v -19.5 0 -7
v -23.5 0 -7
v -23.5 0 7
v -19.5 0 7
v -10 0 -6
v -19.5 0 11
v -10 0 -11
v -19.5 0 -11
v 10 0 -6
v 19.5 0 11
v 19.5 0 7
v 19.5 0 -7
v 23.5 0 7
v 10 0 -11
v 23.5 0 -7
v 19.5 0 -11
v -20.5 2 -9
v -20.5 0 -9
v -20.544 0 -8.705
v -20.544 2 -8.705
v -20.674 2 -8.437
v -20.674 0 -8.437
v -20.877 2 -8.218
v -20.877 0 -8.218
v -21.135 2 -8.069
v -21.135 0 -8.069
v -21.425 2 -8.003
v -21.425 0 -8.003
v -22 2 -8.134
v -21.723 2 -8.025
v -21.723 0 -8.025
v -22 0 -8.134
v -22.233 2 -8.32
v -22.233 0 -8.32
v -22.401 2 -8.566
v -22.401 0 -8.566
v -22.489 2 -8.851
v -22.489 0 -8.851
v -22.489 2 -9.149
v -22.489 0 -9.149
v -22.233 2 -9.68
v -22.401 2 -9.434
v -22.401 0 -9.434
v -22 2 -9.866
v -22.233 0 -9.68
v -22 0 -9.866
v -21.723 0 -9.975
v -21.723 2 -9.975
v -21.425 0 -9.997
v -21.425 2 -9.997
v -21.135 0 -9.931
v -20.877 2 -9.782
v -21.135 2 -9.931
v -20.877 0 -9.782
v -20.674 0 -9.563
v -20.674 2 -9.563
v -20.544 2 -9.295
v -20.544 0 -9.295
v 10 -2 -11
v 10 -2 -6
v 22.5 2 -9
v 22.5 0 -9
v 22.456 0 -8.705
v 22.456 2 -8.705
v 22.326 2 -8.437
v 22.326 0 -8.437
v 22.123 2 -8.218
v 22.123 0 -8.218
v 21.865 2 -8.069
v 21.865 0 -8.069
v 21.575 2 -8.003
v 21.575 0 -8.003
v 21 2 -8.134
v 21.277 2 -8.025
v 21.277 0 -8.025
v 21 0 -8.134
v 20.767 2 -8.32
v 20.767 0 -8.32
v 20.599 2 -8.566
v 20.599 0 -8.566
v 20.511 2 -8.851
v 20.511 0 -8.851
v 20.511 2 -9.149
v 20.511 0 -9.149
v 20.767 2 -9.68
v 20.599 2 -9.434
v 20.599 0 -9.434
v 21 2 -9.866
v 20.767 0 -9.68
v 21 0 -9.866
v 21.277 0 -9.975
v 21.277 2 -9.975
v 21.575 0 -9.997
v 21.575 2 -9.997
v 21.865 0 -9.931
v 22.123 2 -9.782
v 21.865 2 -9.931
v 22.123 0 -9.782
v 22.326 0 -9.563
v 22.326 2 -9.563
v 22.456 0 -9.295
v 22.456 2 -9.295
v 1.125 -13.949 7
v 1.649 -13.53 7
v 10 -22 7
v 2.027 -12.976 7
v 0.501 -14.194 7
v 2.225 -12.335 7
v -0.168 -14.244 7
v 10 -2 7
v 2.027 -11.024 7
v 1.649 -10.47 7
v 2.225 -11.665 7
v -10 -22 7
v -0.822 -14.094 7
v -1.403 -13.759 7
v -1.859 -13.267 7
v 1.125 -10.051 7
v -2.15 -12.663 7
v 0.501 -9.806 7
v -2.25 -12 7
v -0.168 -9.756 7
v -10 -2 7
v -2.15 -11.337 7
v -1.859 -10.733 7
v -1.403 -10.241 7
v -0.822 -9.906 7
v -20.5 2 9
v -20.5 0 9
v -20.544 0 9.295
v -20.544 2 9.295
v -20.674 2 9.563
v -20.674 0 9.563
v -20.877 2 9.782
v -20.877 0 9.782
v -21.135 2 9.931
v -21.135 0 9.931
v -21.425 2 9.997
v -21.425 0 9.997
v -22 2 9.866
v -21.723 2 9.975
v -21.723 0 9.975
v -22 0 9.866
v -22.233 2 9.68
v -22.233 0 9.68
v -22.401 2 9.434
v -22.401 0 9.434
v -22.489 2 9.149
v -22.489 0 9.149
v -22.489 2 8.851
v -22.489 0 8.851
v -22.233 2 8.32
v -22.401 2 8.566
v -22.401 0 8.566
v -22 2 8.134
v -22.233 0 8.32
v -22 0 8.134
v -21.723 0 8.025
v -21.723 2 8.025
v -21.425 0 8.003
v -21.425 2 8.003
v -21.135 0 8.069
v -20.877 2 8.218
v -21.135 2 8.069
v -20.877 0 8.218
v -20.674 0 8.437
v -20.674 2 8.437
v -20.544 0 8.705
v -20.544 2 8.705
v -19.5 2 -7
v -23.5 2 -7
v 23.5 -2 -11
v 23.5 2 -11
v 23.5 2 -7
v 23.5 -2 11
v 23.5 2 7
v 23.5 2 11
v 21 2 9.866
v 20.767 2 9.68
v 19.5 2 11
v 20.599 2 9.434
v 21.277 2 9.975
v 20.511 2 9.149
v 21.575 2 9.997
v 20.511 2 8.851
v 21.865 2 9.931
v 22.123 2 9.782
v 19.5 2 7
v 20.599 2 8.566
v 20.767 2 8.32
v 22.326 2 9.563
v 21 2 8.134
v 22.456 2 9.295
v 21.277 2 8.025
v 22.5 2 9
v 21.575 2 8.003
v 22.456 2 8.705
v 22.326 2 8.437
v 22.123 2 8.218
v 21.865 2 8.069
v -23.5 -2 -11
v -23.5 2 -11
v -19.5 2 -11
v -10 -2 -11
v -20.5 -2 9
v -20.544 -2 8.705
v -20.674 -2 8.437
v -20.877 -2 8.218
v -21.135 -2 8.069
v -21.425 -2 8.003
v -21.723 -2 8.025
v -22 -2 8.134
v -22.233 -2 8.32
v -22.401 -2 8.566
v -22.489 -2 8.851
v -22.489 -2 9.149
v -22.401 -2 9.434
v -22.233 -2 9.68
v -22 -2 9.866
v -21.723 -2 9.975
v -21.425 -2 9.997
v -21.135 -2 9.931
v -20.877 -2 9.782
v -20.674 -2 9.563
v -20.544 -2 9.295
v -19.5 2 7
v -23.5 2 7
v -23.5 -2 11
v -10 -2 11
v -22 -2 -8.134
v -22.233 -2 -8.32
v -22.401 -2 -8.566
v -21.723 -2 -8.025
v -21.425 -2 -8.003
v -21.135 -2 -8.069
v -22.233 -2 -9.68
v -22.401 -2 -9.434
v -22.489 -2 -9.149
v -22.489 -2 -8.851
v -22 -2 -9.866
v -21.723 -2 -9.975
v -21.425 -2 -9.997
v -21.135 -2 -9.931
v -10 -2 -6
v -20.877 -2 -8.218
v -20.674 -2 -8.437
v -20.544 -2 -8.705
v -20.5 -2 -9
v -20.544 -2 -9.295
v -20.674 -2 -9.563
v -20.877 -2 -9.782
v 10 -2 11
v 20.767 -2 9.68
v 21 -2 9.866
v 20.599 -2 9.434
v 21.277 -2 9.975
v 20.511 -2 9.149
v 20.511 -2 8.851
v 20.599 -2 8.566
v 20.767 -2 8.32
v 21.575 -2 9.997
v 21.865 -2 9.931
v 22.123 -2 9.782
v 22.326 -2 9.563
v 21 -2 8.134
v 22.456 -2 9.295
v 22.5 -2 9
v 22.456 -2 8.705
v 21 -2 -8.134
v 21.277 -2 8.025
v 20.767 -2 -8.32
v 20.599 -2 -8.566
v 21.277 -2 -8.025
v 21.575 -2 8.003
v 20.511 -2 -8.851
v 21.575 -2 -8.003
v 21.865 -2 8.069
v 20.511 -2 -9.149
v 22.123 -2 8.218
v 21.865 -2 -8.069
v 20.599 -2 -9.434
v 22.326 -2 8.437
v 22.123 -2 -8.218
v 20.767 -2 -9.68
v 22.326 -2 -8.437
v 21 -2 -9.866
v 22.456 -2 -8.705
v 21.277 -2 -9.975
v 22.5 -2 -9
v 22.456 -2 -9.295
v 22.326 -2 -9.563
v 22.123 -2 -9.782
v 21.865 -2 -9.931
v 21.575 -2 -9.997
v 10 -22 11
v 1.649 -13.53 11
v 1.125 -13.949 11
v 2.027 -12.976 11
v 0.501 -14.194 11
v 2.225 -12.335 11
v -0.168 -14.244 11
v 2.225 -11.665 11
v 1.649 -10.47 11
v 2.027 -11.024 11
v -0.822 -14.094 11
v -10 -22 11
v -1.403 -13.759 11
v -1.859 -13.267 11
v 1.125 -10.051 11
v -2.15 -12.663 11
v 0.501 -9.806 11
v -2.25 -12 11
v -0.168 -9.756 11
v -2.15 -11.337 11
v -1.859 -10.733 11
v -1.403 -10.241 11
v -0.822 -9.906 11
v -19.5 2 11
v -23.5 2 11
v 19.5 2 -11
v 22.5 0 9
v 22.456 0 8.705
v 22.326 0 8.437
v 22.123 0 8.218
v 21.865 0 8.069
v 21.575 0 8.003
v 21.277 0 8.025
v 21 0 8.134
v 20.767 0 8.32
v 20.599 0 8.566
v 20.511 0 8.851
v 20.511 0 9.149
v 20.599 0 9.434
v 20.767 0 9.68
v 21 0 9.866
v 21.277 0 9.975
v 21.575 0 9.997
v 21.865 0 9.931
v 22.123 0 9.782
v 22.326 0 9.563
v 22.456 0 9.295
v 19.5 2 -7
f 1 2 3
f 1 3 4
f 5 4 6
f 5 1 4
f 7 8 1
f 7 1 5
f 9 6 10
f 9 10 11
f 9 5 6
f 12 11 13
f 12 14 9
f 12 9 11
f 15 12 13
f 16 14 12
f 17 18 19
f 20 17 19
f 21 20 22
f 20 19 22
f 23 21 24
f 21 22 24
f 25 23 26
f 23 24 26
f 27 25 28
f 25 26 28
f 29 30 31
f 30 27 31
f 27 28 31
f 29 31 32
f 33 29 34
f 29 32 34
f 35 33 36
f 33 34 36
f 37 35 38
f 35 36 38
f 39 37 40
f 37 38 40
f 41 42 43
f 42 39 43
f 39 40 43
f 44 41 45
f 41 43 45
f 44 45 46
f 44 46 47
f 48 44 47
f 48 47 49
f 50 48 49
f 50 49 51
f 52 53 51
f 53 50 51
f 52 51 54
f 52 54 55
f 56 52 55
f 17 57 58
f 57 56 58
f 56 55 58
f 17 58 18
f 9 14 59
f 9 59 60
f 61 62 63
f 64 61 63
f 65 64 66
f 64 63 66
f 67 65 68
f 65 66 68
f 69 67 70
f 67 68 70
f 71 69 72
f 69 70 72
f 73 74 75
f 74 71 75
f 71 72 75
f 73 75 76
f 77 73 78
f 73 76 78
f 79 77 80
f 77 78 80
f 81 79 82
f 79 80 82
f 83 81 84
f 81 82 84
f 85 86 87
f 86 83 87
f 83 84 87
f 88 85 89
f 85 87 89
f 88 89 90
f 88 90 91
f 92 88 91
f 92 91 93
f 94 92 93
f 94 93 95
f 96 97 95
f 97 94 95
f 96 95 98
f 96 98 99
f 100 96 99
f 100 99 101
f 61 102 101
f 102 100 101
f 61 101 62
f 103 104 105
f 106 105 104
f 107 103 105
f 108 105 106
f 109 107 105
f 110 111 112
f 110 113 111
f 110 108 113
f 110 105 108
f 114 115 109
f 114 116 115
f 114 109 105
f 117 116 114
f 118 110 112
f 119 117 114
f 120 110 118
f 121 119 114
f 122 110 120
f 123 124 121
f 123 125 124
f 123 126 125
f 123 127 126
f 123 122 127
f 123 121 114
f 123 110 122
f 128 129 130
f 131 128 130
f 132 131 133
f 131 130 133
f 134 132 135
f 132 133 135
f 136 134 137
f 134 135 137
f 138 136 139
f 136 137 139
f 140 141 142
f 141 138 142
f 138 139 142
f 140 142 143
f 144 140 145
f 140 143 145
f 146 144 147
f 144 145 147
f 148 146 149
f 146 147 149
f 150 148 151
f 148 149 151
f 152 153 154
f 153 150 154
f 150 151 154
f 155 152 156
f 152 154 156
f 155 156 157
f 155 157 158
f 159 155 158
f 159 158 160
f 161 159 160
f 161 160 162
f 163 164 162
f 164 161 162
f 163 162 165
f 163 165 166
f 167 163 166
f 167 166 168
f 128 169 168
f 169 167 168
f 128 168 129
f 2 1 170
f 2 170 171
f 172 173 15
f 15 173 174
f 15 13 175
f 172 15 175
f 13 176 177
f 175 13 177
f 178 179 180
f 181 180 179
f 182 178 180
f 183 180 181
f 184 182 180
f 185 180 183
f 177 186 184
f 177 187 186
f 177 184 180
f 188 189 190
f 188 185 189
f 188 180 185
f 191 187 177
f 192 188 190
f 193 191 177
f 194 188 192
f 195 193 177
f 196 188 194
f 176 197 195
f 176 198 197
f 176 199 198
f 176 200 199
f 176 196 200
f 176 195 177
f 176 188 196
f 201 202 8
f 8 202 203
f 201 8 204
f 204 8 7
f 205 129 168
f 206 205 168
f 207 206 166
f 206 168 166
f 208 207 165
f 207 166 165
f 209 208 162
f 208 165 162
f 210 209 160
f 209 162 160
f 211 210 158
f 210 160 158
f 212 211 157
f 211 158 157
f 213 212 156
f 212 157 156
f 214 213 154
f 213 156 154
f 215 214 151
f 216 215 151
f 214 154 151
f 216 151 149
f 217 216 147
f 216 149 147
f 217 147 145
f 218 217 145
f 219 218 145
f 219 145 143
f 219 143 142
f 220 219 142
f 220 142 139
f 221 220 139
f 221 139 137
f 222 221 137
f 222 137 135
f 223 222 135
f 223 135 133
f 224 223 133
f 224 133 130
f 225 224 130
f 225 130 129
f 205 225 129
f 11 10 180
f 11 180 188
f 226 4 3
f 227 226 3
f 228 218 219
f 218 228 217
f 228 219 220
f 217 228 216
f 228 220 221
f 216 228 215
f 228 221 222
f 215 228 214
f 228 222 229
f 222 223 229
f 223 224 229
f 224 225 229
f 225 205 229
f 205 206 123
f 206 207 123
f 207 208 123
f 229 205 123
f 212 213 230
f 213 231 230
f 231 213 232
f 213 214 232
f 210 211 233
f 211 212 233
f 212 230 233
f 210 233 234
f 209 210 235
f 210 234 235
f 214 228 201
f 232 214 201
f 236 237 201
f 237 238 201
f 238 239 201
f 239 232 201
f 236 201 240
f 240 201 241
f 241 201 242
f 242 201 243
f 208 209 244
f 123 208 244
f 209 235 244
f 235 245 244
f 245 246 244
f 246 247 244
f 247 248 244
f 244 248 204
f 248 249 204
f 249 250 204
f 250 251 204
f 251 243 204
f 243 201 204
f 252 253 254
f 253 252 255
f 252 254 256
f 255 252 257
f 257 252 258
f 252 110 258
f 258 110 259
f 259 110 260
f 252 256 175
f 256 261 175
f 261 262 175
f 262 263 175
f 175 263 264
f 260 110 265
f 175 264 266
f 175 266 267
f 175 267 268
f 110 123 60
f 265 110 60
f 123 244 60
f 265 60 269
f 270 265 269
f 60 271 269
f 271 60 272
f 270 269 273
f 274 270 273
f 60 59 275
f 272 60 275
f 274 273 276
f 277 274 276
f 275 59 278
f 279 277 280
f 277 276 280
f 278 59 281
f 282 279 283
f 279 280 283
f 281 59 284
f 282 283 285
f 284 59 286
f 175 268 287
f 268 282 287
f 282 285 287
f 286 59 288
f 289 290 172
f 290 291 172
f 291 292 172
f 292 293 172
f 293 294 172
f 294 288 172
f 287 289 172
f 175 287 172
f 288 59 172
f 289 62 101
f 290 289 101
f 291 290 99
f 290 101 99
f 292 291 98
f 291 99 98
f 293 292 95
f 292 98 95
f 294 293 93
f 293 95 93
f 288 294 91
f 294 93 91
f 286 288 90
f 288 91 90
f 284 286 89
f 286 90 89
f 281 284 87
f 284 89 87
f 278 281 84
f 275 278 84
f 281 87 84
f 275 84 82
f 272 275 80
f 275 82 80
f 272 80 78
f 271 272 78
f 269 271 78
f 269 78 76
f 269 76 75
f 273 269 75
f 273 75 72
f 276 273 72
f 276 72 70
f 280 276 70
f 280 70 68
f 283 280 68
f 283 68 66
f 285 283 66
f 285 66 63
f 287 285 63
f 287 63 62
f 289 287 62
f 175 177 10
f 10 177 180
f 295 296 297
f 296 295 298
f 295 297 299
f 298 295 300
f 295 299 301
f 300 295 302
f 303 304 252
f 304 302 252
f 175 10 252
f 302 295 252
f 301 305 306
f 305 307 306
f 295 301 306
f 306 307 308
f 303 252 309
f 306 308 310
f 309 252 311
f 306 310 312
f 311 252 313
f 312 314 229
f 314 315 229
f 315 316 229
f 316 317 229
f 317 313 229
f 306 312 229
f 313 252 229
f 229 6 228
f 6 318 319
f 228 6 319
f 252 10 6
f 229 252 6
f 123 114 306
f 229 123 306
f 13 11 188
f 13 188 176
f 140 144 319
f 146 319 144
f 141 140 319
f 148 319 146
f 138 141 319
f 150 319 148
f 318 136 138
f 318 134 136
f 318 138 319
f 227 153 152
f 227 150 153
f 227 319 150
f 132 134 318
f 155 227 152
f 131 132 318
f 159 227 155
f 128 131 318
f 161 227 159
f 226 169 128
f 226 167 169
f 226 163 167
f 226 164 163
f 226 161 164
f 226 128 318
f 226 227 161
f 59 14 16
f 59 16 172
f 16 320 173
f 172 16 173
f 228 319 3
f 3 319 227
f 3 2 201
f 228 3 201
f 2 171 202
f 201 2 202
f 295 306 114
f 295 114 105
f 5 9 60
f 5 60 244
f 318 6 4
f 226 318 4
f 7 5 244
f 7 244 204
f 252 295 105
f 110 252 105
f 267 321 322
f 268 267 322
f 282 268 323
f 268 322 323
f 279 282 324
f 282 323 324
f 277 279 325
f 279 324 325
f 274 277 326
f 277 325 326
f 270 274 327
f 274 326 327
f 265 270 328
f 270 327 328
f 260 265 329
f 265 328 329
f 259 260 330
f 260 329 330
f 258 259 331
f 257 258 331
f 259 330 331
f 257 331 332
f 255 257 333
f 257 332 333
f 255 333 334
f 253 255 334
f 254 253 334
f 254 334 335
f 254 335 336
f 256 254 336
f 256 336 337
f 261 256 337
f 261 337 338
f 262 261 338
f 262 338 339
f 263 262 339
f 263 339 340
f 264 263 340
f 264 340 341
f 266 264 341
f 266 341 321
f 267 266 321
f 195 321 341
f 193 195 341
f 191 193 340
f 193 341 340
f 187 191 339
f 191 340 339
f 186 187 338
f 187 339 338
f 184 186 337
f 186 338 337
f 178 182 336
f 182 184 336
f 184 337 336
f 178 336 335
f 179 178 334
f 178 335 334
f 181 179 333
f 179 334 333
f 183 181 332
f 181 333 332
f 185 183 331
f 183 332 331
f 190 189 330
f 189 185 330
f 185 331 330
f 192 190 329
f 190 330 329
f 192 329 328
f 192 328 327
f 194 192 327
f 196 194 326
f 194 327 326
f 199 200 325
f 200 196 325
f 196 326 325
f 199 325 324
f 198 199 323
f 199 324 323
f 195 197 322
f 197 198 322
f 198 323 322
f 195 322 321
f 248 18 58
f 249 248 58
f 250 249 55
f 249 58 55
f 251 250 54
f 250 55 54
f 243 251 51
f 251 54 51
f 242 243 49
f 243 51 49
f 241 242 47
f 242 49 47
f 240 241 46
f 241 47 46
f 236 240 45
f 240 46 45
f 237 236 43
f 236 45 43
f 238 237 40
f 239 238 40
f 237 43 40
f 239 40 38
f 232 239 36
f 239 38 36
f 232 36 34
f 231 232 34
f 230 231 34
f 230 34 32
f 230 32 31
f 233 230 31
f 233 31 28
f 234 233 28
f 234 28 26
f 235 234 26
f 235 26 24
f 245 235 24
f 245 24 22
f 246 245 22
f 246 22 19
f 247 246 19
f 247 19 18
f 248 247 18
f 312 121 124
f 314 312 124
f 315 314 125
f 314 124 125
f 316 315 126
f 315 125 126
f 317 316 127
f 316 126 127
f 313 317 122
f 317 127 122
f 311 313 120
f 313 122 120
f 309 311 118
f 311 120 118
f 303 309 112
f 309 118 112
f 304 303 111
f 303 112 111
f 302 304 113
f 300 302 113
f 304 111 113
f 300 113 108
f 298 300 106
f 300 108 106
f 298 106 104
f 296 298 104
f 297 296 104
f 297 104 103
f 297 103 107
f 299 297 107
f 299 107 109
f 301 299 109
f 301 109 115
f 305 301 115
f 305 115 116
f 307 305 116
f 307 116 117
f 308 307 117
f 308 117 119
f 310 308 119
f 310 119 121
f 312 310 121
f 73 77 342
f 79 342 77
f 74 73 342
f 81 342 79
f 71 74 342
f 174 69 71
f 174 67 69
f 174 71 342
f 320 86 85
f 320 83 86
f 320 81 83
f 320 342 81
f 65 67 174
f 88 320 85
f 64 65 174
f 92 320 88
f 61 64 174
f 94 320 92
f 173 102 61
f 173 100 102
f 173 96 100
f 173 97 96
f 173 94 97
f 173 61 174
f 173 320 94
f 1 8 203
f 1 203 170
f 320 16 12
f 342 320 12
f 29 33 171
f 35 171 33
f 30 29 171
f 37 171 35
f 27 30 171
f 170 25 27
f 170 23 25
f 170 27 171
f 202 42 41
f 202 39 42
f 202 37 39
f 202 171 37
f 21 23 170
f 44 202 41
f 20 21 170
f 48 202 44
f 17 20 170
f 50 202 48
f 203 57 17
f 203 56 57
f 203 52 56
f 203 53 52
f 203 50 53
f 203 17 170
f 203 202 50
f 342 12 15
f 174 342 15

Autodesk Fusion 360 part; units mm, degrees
sketch "Sketch1" plane through (0, 0, 0) normal (0, 1, 0) x (1, 0, 0)
  line L0 (-21.5, 9) -> (21.5, 9) construction
  line L1 (21.5, 9) -> (21.5, -9) construction
  line L2 (21.5, -9) -> (-21.5, -9) construction
  line L3 (-21.5, -9) -> (-21.5, 9) construction
  line L4 (-21.5, 9) -> (21.5, -9) construction
  circle A0 centre (-21.5, -9) radius 1
  circle A1 centre (21.5, -9) radius 1
  circle A2 centre (-21.5, 9) radius 1
  circle A3 centre (21.5, 9) radius 1
  line L5 (23.5, -11) -> (-23.5, -11)
  line L6 (-23.5, -11) -> (-23.5, 11)
  line L7 (-23.5, 11) -> (23.5, 11)
  line L8 (23.5, 11) -> (23.5, -11)
  line L9 (-23.5, 11) -> (-19.5, 11)
  line L10 (-19.5, 11) -> (-19.5, 7)
  line L11 (-19.5, 7) -> (-23.5, 7)
  line L12 (-23.5, 7) -> (-23.5, 11)
  line L13 (-23.5, -11) -> (-19.5, -11)
  line L14 (-19.5, -11) -> (-19.5, -7)
  line L15 (-19.5, -7) -> (-23.5, -7)
  line L16 (-23.5, -7) -> (-23.5, -11)
  line L17 (23.5, 11) -> (19.5, 11)
  line L18 (19.5, 11) -> (19.5, 7)
  line L19 (19.5, 7) -> (23.5, 7)
  line L20 (23.5, 7) -> (23.5, 11)
  line L21 (23.5, -11) -> (19.5, -11)
  line L22 (19.5, -11) -> (19.5, -7)
  line L23 (19.5, -7) -> (23.5, -7)
  line L24 (23.5, -7) -> (23.5, -11)
  line L25 (-10, 11) -> (10, 11)
  line L26 (10, 11) -> (10, 6)
  line L27 (10, 6) -> (-10, 6)
  line L28 (-10, 6) -> (-10, 11)
  dimension "d1" = 43
  dimension "d2" = 18
  dimension "d3" = 2
  dimension "d4" = 2
  dimension "d5" = 2
  dimension "d6" = 2
  dimension "d7" = -2
  dimension "d8" = 4
  dimension "d9" = 4
  dimension "d10" = 4
  dimension "d11" = 4
  dimension "d12" = 4
  dimension "d13" = 4
  dimension "d14" = 4
  dimension "d15" = 4
  dimension "d28" = 20
  dimension "d29" = 5
extrude "Extrude1" add sketch "Sketch1" against normal blind 2 contours L5 L8 L21 L22 L23 L24 | L5 L6 L7 L8 L10 L11 L14 L15 L18 L19 L22 L23 L26 L27 L28 | L5 L6 L13 L14 L15 L16 | L7 L8 L17 L18 L19 L20 | L6 L7 L9 L10 L11 L12
extrude "Extrude2" add sketch "Sketch1" along normal blind 2 contours L5 L8 L21 L22 L23 L24 | L5 L6 L13 L14 L15 L16 | L7 L8 L17 L18 L19 L20 | L6 L7 L9 L10 L11 L12
sketch "Sketch2" plane through (0, -2, 0) normal (0, -1, 0) x (1, 0, 0)
  circle A0 centre (-21.5, 9) radius 1
  circle A1 centre (-21.5, -9) radius 1
  circle A2 centre (21.5, 9) radius 1
  circle A3 centre (21.5, -9) radius 1
  line L0 (23.5, -11) -> (23.5, 11)
  line L1 (23.5, 11) -> (-23.5, 11)
  line L2 (-23.5, 11) -> (-23.5, -11)
  line L3 (10, -11) -> (23.5, -11)
  line L4 (-10, 11) -> (10, 11)
  line L5 (10, 11) -> (10, -9)
  line L6 (10, -9) -> (-10, -9)
  line L7 (-10, -9) -> (-10, 11)
  line L8 (23.5, 11) -> (-23.5, 11)
  line L9 (-10, 11) -> (10, 11)
  line L10 (10, 11) -> (10, 7)
  line L11 (10, 7) -> (-10, 7)
  line L12 (-10, 7) -> (-10, 11)
  line L13 (10, -6) -> (10, -11)
  line L14 (-23.5, -11) -> (-10, -11)
  line L15 (-10, -11) -> (-10, -6)
  line L16 (-10, -6) -> (10, -6)
  dimension "d20" = 20
  dimension "d21" = 20
  dimension "d22" = 4
extrude "Extrude3" add sketch "Sketch2" along normal blind 20 contours L1 L4 L5 L7 L8 L9 L10 L11 L12
sketch "Sketch3" plane through (0, 0, 7) normal (0, 0, -1) x (-1, 0, 0)
  line L0 (10, -2) -> (-10, -2)
  line L1 (-10, -2) -> (-10, -22)
  line L2 (-10, -22) -> (10, -22)
  line L3 (10, -22) -> (10, -2)
  circle A0 centre (0, -12) radius 2.25
  line L4 (10, -22) -> (-10, -2) construction
  dimension "d25" = 4.5
extrude "Extrude4" cut sketch "Sketch3" against normal blind 4 contours A0
